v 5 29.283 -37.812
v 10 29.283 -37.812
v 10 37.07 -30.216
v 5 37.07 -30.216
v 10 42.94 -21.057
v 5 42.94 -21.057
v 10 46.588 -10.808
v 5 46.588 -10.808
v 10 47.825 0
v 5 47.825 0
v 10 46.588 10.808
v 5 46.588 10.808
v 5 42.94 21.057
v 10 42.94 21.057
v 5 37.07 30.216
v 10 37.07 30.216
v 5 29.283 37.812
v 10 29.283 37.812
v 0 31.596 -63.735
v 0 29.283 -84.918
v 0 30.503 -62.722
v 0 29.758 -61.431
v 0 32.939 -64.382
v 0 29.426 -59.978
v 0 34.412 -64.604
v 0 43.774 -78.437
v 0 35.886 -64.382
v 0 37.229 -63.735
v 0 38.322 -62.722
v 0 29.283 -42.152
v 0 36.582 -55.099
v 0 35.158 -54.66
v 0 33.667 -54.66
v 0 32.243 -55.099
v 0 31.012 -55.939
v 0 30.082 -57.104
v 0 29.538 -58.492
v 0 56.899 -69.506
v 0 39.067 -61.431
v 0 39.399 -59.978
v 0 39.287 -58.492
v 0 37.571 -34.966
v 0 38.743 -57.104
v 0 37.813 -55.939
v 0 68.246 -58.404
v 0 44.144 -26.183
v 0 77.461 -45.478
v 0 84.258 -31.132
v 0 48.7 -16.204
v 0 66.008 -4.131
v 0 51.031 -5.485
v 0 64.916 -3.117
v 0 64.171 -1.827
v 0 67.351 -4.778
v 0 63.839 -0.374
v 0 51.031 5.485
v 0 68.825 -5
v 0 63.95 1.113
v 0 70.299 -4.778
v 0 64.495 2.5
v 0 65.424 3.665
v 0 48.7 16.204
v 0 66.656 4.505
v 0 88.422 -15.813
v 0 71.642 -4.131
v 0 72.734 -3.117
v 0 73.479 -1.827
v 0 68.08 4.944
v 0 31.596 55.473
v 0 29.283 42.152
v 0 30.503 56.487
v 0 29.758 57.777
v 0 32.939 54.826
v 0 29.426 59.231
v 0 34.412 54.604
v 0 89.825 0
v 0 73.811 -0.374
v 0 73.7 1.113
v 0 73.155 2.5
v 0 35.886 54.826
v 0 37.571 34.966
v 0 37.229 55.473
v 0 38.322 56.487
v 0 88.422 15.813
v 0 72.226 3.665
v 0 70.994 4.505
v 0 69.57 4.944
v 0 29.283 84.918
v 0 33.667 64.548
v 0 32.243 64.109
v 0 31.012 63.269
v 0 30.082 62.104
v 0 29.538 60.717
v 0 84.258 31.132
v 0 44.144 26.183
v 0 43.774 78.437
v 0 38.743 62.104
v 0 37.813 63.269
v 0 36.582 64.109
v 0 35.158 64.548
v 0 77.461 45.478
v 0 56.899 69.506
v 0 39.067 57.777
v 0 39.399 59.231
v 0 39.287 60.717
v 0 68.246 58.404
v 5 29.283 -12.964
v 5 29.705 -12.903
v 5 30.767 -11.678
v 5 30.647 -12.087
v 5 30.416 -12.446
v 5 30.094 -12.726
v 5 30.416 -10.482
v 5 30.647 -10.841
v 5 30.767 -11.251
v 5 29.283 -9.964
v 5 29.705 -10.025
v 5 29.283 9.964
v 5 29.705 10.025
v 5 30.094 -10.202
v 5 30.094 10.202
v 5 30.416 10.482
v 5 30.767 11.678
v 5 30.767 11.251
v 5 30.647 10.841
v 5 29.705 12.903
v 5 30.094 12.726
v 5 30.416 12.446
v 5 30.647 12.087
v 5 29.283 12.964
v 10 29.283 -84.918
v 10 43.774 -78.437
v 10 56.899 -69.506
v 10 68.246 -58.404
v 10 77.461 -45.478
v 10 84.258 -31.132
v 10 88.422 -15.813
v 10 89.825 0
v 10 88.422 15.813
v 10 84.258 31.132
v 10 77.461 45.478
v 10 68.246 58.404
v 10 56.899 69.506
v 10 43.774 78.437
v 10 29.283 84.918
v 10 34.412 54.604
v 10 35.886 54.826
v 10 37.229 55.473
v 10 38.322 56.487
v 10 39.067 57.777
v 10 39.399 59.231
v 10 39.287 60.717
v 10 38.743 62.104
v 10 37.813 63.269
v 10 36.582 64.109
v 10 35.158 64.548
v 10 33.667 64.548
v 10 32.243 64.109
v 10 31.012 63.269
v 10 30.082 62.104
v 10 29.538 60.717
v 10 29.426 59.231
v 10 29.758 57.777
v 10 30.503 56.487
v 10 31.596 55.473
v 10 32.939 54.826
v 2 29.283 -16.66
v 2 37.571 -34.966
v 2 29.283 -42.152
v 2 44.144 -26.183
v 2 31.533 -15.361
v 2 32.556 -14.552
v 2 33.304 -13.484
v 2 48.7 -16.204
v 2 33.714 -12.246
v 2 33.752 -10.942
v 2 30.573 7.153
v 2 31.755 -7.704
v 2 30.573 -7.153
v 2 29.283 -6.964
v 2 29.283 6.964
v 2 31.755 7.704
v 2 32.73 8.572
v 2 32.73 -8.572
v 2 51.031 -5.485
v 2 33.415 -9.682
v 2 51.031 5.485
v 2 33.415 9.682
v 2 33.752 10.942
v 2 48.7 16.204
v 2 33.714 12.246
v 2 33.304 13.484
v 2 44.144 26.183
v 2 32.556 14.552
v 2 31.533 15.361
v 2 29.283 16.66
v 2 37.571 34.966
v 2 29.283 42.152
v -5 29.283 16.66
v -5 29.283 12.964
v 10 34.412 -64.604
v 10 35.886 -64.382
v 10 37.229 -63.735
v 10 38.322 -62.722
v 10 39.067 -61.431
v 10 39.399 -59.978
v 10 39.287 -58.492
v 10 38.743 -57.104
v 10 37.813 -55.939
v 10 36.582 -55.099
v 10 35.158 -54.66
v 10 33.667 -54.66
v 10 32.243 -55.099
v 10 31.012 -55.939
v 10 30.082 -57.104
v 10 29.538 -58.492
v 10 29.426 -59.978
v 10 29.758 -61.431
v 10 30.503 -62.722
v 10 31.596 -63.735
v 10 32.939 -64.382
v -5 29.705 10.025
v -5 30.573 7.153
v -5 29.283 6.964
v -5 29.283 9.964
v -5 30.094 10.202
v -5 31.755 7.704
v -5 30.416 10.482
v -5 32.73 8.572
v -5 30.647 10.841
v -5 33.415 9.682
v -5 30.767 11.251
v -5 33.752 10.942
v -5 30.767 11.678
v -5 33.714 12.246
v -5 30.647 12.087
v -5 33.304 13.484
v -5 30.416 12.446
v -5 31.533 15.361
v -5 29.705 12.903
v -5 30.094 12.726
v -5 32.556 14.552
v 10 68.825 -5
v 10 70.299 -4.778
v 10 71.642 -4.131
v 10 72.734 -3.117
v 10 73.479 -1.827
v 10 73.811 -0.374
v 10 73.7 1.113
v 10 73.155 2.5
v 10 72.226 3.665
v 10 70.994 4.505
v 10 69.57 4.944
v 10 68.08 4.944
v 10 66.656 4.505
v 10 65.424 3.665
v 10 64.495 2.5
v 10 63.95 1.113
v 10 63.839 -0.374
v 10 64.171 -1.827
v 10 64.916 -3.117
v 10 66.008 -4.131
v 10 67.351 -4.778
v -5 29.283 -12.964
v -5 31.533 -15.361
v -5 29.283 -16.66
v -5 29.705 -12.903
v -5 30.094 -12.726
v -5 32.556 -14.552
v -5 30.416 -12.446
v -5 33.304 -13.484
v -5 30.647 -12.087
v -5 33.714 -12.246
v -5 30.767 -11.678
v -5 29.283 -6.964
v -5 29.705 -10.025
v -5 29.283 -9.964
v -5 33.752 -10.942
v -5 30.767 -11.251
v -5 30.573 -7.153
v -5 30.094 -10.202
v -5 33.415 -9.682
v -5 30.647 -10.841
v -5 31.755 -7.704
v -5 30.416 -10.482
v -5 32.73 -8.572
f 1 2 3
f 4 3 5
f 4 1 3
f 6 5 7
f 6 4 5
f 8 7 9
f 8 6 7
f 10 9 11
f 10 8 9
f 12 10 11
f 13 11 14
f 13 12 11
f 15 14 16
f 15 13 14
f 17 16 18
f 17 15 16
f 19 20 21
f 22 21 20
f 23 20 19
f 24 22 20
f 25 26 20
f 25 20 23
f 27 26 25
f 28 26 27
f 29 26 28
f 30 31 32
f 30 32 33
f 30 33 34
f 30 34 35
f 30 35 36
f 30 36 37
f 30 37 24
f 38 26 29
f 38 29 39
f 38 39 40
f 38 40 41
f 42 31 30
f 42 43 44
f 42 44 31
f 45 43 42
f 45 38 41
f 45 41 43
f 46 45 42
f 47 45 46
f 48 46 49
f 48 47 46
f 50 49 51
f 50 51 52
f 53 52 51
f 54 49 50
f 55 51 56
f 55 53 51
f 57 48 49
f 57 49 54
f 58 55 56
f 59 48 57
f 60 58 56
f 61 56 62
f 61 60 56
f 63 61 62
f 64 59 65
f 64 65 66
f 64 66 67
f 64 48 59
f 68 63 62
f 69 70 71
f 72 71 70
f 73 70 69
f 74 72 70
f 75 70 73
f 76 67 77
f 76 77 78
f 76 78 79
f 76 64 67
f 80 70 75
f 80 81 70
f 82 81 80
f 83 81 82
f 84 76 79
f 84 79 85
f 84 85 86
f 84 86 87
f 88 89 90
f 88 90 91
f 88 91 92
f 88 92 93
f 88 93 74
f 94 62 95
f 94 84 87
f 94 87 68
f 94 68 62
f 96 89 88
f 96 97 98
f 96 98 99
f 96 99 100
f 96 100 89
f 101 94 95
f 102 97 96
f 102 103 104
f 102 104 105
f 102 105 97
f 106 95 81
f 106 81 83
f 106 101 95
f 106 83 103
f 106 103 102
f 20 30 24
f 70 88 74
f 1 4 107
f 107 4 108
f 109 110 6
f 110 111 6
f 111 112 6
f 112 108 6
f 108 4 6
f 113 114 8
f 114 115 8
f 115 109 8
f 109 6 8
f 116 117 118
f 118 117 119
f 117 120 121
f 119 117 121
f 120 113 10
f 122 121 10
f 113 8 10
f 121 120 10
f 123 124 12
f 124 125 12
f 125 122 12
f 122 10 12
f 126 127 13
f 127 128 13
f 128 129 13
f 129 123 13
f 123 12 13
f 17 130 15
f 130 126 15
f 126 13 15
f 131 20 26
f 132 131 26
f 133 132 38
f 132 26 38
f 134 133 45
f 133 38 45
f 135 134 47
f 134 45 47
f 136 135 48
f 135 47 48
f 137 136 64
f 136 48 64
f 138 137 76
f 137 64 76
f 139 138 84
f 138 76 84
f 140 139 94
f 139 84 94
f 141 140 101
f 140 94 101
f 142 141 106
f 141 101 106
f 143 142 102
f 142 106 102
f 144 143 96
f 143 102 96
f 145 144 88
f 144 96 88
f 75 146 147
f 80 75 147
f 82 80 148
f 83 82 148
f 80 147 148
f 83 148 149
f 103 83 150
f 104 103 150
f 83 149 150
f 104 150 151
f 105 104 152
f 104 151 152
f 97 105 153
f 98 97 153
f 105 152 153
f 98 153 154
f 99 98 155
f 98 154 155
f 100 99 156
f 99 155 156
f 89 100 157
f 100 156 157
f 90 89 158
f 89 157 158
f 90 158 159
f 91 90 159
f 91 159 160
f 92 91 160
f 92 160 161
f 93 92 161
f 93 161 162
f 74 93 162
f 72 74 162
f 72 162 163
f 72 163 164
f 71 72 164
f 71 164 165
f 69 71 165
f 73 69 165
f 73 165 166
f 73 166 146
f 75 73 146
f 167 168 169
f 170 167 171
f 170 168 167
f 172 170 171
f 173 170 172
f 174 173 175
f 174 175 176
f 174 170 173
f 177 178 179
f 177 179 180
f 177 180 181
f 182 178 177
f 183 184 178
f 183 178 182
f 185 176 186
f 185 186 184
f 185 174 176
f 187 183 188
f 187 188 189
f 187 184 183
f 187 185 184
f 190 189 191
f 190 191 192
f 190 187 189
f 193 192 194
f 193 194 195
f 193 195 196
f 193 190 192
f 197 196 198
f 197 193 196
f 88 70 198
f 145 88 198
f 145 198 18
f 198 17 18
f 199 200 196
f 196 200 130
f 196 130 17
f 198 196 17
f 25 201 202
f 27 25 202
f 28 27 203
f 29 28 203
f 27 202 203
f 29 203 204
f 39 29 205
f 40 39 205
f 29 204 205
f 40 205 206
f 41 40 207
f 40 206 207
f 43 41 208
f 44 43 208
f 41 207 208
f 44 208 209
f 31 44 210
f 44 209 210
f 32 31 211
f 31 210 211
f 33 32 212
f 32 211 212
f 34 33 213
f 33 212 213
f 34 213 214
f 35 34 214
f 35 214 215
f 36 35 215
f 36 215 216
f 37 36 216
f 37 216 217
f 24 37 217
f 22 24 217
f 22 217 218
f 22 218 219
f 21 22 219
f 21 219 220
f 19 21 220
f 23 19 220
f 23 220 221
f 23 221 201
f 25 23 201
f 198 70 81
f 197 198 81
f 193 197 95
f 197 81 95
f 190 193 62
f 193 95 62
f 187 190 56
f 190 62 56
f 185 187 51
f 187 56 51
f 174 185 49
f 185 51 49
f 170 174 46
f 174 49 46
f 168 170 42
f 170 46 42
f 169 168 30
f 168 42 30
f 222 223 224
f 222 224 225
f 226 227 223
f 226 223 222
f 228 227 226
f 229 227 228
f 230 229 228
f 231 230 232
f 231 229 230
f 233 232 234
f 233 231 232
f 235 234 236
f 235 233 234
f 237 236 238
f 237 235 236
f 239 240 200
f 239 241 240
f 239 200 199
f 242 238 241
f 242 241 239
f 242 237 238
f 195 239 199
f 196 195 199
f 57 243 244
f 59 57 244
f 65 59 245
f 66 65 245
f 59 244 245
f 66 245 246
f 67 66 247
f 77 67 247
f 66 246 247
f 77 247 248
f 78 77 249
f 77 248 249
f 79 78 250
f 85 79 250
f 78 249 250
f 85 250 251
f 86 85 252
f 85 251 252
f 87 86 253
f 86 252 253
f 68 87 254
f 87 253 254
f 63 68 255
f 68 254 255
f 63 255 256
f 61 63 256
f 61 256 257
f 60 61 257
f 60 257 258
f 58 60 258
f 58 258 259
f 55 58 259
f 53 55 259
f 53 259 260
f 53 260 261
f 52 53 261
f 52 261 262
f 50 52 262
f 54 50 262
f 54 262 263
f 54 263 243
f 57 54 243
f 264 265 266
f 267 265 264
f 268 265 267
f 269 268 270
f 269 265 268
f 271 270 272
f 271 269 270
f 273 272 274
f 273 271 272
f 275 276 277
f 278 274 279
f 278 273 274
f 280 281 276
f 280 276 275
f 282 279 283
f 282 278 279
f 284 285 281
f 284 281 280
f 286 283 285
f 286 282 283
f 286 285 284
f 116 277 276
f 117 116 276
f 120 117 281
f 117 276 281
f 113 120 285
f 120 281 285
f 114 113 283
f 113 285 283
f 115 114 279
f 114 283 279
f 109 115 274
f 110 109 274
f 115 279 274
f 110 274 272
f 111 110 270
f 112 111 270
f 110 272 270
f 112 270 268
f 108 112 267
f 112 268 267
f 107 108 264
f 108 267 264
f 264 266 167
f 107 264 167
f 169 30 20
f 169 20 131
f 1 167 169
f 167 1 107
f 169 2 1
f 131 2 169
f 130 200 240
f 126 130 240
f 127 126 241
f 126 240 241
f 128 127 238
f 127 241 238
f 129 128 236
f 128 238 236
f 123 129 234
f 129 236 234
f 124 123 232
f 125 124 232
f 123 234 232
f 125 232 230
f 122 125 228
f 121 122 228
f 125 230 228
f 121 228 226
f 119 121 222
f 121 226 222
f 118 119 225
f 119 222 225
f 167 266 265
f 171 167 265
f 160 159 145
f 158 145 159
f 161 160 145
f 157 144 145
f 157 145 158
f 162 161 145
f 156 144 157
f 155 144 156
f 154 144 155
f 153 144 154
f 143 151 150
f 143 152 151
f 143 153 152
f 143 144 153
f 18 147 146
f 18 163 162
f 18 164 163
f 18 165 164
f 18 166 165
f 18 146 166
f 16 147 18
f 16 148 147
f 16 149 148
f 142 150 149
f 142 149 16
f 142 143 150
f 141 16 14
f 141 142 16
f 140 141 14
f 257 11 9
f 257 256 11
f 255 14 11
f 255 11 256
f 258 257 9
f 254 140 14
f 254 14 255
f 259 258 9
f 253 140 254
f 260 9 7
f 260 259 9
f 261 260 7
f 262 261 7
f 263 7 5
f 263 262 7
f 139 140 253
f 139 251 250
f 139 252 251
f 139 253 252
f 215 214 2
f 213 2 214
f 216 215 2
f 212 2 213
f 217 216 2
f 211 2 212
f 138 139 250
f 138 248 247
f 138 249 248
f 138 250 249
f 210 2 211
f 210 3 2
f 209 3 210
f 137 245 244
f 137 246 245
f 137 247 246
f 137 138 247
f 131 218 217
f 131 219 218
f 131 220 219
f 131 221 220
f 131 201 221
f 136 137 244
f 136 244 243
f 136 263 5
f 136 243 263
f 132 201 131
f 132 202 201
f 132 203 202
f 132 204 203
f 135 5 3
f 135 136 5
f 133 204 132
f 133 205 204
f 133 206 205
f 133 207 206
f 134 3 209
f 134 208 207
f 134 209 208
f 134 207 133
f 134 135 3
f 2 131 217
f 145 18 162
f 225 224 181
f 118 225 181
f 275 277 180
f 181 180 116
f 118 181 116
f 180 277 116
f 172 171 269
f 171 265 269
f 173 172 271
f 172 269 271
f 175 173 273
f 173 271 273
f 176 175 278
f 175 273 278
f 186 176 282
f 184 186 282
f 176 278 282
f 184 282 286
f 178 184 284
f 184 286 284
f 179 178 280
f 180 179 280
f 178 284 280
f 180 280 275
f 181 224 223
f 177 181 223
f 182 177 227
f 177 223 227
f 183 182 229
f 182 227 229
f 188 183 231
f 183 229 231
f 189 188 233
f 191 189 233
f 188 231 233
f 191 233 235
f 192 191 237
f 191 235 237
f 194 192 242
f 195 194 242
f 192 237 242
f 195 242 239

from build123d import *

# Parameters (mm, degrees)
SKETCH1_R                   = 89.825
SKETCH1_R_2                 = 47.825
BOSS_EXTRUDE1_DEPTH         = 10
SKETCH3_R                   = 47.825
TBH_IDK_DEPTH               = 5
EXTRUSION_START             = 5
SKETCH4_R                   = 47.825
EXTRUSION_TO_FUEL_MAN_DEPTH = 5
OX_DOWNCOMER_REACH          = 129.914
OX_PROFILE_R                = 1.5
OX_ORIFICES_COUNT           = 3
SKETCH7_R                   = 47.825
FUEL_BLOCKERS_DEPTH         = 5
SKETCH8_R                   = 25.085
TI_CUT_EXTRUDE_DEPTH        = 128.424727781
SKETCH9_R                   = 51.325
FUEL_VOLUME_DEPTH           = 2
SKETCH10_R                  = 5
CUT_EXTRUDE1_DEPTH          = 128.91427305
SKETCH12_W                  = 10
SKETCH12_H                  = 179.65
CUT_EXTRUDE2_DEPTH          = 150.516390415


with BuildPart() as part:
    # Sketch1 → Boss-Extrude1 (new body)
    with BuildSketch(Plane(origin=(0, 0, 0), x_dir=(0, 0, -1), z_dir=(1, 0, 0))):
        Circle(SKETCH1_R)
        Circle(SKETCH1_R_2, mode=Mode.SUBTRACT)
    extrude(amount=BOSS_EXTRUDE1_DEPTH)

    # Sketch3 → tbh idk (add)
    with BuildSketch(Plane.ZY):
        Circle(SKETCH3_R)
    extrude(amount=-TBH_IDK_DEPTH)

    # Sketch4 → Extrusion to Fuel Man (add)
    with BuildSketch(Plane.ZY.offset(EXTRUSION_START)):
        Circle(SKETCH4_R)
    extrude(amount=-EXTRUSION_TO_FUEL_MAN_DEPTH)

    # Ox Profile → Ox Downcomer (cut, up to next)
    with BuildSketch(Plane.ZY.offset(5), mode=Mode.PRIVATE) as ox_downcomer_sk1:
        with Locations((11.464101615, 29.2826)):
            Circle(OX_PROFILE_R)
    ox_downcomer_tool1 = extrude(ox_downcomer_sk1.sketch, amount=-OX_DOWNCOMER_REACH, mode=Mode.PRIVATE) & part.part
    # Ox Profile → Ox Downcomer (cut, up to next)
    with BuildSketch(Plane.ZY.offset(5), mode=Mode.PRIVATE) as ox_downcomer_sk2:
        with Locations((-11.464101615, 29.2826)):
            Circle(OX_PROFILE_R)
    ox_downcomer_tool2 = extrude(ox_downcomer_sk2.sketch, amount=-OX_DOWNCOMER_REACH, mode=Mode.PRIVATE) & part.part
    ox_downcomer_1 = ox_downcomer_tool1.solids().sort_by_distance((-5, 29.2826, 11.464102))[0]
    add(ox_downcomer_1, mode=Mode.SUBTRACT)
    ox_downcomer_2 = ox_downcomer_tool2.solids().sort_by_distance((-5, 29.2826, -11.464102))[0]
    add(ox_downcomer_2, mode=Mode.SUBTRACT)
    ox_downcomer = ox_downcomer_1 + ox_downcomer_2  # Ox Downcomer as one shape, for the pattern or mirror that repeats it

    # Ox Orifices: Ox Downcomer ×3 about axis
    ox_orifices_axis = Axis((0, -0.057725471, 0), (1, 0, 0))
    for i in range(1, OX_ORIFICES_COUNT):
        add(ox_downcomer.rotate(ox_orifices_axis, i * 360 / OX_ORIFICES_COUNT), mode=Mode.SUBTRACT)

    # Sketch7 → Fuel Blockers (cut)
    with BuildSketch(Plane.ZY.offset(5)):
        Circle(SKETCH7_R)
        with BuildLine():
            Line((-34.988640613, -2.46309677), (-15.361215932, 31.5326))
            ThreePointArc((-15.361215932, 31.5326), (-10.299415912, 33.629266218), (-6.964101615, 29.2826))
            ThreePointArc((-6.964101615, 29.2826), (0, 22.318498385), (6.964101615, 29.2826))
            ThreePointArc((6.964101615, 29.2826), (10.299415912, 33.629266218), (15.361215932, 31.5326))
            Line((15.361215932, 31.5326), (34.988640613, -2.46309677))
            ThreePointArc((34.988640613, -2.46309677), (34.273506812, -7.895077285), (28.841526296, -8.610211087))
            ThreePointArc((28.841526296, -8.610211087), (19.328386576, -11.159249192), (21.877424681, -20.672388913))
            ThreePointArc((21.877424681, -20.672388913), (23.9740909, -25.734188933), (19.627424681, -29.06950323))
            Line((19.627424681, -29.06950323), (-19.627424681, -29.06950323))
            ThreePointArc((-19.627424681, -29.06950323), (-23.9740909, -25.734188933), (-21.877424681, -20.672388913))
            ThreePointArc((-21.877424681, -20.672388913), (-19.328386576, -11.159249192), (-28.841526296, -8.610211087))
            ThreePointArc((-28.841526296, -8.610211087), (-34.273506812, -7.895077285), (-34.988640613, -2.46309677))
        make_face(mode=Mode.SUBTRACT)
    extrude(amount=-FUEL_BLOCKERS_DEPTH, mode=Mode.SUBTRACT)

    # Sketch8 → TI Cut Extrude (cut, through all)
    with BuildSketch(Plane(origin=(5, 0, 0), x_dir=(0, 0, -1), z_dir=(1, 0, 0))):
        Circle(SKETCH8_R)
    extrude(amount=-TI_CUT_EXTRUDE_DEPTH, mode=Mode.SUBTRACT)

    # Sketch9 → Fuel Volume (cut)
    with BuildSketch(Plane.ZY):
        Circle(SKETCH9_R)
        with BuildLine():
            ThreePointArc((-15.361215932, 31.5326), (-10.299415912, 33.629266218), (-6.964101615, 29.2826))
            ThreePointArc((-6.964101615, 29.2826), (-6.485666055, 26.745899952), (-5.116096664, 24.557743787))
            ThreePointArc((-5.116096664, 24.557743787), (0, 25.085), (5.116096664, 24.557743787))
            ThreePointArc((5.116096664, 24.557743787), (6.485666055, 26.745899952), (6.964101615, 29.2826))
            ThreePointArc((6.964101615, 29.2826), (10.299415912, 33.629266218), (15.361215932, 31.5326))
            Line((15.361215932, 31.5326), (34.988640613, -2.46309677))
            ThreePointArc((34.988640613, -2.46309677), (34.273506812, -7.895077285), (28.841526296, -8.610211087))
            ThreePointArc((28.841526296, -8.610211087), (26.405461833, -7.756198412), (23.825678311, -7.848202214))
            ThreePointArc((23.825678311, -7.848202214), (21.724247254, -12.5425), (18.709581647, -16.709541573))
            ThreePointArc((18.709581647, -16.709541573), (19.919795778, -18.98970154), (21.877424681, -20.672388913))
            ThreePointArc((21.877424681, -20.672388913), (23.9740909, -25.734188933), (19.627424681, -29.06950323))
            Line((19.627424681, -29.06950323), (-19.627424681, -29.06950323))
            ThreePointArc((-19.627424681, -29.06950323), (-23.9740909, -25.734188933), (-21.877424681, -20.672388913))
            ThreePointArc((-21.877424681, -20.672388913), (-19.919795778, -18.98970154), (-18.709581647, -16.709541573))
            ThreePointArc((-18.709581647, -16.709541573), (-21.724247254, -12.5425), (-23.825678311, -7.848202214))
            ThreePointArc((-23.825678311, -7.848202214), (-26.405461833, -7.756198412), (-28.841526296, -8.610211087))
            ThreePointArc((-28.841526296, -8.610211087), (-34.273506812, -7.895077285), (-34.988640613, -2.46309677))
            Line((-34.988640613, -2.46309677), (-15.361215932, 31.5326))
        make_face(mode=Mode.SUBTRACT)
    extrude(amount=-FUEL_VOLUME_DEPTH, mode=Mode.SUBTRACT)

    # Sketch10 → Cut-Extrude1 (cut, through all)
    with BuildSketch(Plane(origin=(10, 0, 0), x_dir=(0, 0, -1), z_dir=(1, 0, 0))):
        with Locations((0, 68.825)):
            Circle(SKETCH10_R)
        with Locations((59.604198415, 34.4125)):
            Circle(SKETCH10_R)
        with Locations((59.604198415, -34.4125)):
            Circle(SKETCH10_R)
        with Locations((0, -68.825)):
            Circle(SKETCH10_R)
        with Locations((-59.604198415, -34.4125)):
            Circle(SKETCH10_R)
        with Locations((-59.604198415, 34.4125)):
            Circle(SKETCH10_R)
    extrude(amount=-CUT_EXTRUDE1_DEPTH, mode=Mode.SUBTRACT)

    # Sketch12 → Cut-Extrude2 (cut, through all)
    with BuildSketch(Plane(origin=(0, 29.2826, 0), x_dir=(1, 0, 0), z_dir=(0, 1, 0))):
        with Locations((5, 0)):
            Rectangle(SKETCH12_W, SKETCH12_H)
        Polygon((-5, -34.988640613), (-5, -35.591526296), (0, -35.591526296), (0, 35.591526296), (-5, 35.591526296), (-5, 34.988640613), (-5, 28.841526296), (-5, 18.709581647), (-5, 15.361215932), (-5, -6.964101615), (-5, -15.361215932), (-5, -18.709581647), (-5, -28.841526296), align=None)
    extrude(amount=-CUT_EXTRUDE2_DEPTH, mode=Mode.SUBTRACT)


solid = part.part
